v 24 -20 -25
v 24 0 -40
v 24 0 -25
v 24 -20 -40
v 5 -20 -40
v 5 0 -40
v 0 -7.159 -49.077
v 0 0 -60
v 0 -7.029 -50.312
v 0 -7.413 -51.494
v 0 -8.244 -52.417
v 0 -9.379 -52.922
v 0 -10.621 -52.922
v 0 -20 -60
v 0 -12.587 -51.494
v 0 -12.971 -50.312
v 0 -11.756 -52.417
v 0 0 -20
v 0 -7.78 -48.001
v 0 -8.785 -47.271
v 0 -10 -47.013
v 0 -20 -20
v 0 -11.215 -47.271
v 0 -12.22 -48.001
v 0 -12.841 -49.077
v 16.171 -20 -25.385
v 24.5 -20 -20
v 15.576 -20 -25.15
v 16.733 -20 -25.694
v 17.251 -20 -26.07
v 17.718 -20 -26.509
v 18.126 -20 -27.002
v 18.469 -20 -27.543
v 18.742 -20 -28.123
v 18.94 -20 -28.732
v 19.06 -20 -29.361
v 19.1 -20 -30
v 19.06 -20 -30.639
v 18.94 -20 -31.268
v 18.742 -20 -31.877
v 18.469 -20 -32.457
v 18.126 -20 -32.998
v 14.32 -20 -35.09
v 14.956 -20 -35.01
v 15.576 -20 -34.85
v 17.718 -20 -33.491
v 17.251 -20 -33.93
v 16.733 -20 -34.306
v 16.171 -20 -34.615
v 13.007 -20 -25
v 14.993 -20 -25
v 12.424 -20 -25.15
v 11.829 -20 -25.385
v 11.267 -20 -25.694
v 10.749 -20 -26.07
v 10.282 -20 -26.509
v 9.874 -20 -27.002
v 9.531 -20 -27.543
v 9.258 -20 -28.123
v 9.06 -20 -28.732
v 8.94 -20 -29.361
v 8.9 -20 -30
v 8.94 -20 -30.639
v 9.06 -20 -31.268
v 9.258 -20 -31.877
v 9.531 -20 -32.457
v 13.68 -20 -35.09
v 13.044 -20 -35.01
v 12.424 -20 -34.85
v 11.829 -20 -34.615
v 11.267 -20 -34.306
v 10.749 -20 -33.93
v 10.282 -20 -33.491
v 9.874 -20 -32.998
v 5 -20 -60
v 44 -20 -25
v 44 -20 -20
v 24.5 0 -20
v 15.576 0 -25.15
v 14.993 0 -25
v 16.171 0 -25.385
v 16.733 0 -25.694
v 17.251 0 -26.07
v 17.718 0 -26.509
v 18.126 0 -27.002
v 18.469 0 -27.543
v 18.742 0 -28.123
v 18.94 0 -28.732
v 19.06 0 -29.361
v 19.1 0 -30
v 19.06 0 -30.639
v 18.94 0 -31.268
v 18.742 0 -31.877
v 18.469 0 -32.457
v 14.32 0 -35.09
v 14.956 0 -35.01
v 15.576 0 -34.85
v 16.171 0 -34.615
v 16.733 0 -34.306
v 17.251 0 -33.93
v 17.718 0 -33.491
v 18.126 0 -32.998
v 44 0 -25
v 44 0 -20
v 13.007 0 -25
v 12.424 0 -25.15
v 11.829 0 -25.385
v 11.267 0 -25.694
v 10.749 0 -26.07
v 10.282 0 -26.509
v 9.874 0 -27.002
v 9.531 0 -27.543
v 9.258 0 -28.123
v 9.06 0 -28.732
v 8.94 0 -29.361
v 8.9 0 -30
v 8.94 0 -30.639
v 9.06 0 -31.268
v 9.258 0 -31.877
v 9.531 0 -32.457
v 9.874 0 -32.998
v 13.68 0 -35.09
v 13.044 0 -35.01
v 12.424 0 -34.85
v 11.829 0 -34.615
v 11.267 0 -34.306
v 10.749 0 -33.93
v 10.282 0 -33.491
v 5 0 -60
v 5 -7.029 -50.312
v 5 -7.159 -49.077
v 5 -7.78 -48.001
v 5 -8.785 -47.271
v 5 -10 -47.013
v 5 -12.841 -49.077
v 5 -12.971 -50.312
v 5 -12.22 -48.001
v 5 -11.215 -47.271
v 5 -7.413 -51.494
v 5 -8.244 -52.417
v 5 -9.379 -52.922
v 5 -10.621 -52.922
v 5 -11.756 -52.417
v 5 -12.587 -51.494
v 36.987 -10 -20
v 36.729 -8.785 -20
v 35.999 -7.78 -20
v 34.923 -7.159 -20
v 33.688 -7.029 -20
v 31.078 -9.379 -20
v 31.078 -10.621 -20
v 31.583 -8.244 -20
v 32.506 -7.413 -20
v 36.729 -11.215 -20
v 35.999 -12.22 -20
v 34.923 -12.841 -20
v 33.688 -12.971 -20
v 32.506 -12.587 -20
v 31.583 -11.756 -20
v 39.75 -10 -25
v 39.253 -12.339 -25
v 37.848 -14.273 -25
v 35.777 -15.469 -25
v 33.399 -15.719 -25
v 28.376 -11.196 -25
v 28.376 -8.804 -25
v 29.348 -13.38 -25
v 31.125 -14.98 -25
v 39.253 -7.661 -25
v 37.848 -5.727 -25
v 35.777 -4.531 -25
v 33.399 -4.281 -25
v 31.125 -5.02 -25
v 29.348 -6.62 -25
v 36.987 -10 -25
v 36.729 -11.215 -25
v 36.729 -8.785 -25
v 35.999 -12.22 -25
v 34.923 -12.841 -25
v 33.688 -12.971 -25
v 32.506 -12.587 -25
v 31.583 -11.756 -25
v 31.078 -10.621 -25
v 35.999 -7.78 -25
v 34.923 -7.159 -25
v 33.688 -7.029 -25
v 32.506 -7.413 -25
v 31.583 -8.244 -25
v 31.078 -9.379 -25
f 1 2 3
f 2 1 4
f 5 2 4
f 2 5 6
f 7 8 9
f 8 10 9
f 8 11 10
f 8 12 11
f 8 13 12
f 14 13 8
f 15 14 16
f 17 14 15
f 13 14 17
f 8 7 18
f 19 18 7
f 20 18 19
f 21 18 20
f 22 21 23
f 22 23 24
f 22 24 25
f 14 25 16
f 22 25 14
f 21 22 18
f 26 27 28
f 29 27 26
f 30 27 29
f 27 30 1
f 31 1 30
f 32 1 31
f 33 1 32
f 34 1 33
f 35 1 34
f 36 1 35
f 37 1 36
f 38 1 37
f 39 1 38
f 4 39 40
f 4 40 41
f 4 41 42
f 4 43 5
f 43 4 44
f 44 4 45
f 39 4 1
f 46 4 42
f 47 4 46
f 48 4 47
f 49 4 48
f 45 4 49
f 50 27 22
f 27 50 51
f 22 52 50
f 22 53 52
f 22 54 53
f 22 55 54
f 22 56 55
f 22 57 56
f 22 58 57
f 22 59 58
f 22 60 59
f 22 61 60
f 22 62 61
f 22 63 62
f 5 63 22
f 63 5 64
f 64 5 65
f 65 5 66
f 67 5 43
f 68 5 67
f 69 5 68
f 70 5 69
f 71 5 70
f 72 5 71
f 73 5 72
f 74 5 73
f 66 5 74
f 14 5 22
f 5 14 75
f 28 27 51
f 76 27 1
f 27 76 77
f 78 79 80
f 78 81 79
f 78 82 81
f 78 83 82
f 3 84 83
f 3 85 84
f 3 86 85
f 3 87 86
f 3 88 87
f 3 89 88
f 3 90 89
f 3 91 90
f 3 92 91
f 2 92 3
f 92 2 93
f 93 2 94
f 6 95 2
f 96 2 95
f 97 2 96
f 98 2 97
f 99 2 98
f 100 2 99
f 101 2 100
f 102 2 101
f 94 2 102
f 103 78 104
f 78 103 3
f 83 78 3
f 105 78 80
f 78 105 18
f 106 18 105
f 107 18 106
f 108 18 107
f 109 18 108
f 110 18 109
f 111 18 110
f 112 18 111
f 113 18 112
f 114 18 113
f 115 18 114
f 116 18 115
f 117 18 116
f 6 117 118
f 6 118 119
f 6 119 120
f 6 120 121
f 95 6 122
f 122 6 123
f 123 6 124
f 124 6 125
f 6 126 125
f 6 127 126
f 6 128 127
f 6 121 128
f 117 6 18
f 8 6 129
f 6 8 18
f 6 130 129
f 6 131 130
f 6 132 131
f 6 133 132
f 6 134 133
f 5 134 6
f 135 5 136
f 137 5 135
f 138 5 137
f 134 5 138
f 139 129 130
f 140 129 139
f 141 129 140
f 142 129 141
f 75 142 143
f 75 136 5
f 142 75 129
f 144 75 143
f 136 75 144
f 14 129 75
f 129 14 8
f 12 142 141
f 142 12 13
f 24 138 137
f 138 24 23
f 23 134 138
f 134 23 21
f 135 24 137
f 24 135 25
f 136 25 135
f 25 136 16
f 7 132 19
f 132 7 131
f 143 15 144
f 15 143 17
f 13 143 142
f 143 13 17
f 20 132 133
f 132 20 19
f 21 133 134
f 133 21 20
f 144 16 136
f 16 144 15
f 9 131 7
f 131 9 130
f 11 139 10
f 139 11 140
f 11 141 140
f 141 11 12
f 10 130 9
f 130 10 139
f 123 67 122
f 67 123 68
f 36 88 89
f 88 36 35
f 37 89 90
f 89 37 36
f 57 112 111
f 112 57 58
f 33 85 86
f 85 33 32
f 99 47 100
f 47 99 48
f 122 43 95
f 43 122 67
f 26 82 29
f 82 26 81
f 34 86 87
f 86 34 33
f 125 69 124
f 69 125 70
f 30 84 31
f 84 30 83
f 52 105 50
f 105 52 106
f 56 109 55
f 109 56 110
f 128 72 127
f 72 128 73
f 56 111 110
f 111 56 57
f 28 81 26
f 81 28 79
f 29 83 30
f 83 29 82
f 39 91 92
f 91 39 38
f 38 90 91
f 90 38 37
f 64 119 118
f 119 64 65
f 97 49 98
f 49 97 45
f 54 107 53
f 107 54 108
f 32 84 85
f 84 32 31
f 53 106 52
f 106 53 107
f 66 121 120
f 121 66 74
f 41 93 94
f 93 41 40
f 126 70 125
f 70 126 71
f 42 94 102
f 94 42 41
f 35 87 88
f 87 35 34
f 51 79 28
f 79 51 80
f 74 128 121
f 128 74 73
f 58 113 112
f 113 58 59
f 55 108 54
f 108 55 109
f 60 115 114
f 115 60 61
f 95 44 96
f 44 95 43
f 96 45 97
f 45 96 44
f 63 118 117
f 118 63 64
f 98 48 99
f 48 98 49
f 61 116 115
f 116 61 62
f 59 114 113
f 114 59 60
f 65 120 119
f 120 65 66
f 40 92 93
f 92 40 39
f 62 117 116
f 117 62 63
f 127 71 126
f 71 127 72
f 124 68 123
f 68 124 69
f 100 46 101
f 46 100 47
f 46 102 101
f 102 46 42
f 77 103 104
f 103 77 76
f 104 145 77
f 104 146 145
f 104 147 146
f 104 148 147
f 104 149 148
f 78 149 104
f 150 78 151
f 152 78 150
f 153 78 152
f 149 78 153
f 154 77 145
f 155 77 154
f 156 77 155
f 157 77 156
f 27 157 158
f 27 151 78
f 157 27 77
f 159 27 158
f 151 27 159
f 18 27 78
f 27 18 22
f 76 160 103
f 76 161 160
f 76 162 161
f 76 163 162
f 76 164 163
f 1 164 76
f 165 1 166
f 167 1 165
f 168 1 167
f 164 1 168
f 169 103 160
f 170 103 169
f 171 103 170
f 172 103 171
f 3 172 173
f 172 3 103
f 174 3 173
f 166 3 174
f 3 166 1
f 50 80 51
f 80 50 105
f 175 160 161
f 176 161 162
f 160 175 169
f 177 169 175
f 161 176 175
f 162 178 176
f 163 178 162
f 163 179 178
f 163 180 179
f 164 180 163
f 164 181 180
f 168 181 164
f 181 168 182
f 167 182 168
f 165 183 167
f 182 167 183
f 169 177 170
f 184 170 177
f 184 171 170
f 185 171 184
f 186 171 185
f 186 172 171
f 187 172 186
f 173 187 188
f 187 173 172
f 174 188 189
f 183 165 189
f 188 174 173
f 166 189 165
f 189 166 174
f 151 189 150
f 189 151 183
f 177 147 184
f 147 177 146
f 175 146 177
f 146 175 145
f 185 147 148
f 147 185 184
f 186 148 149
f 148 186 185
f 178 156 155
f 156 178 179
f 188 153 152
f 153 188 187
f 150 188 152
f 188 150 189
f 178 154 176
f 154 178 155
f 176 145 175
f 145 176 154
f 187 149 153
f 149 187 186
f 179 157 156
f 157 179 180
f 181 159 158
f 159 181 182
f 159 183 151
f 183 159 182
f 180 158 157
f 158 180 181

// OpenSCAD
// file: sub_front_pulleys.scad
include <nuts_and_bolts.scad>;
include <generals.scad>;

pulley_plate_x = 45;
pulley_plate_y = 28;

pulley_arm_x = pulley_plate_x + alu_x;
pulley_arm_y = pulley_plate_y + alu_x;

module front_pulley(lower = false, left = false)
{
    echo("FP:", lower, left);
	difference()
	{
		union()
		{
			translate([-alu_x, 0, 0]) cube([pulley_arm_x, alu_x, wall]);
			translate([-alu_x, -pulley_arm_y+alu_x, 0]) cube([alu_x, pulley_arm_y, wall]);
			translate([0, -pulley_plate_y, lower ? 0 : wall-thin_wall ]) cube([pulley_plate_x, pulley_plate_y, lower ? wall : thin_wall ]); //lower ? 0 : wall-thin_wall 

        /*    if (lower)
            {
                if(left)
                {
                    translate([hole_dist_1, -hole_dist_1, wall-1]) cylinder(h=alu_x+(wall-thin_wall)-bearing_pulley_h-2*belt_z_offset+1, d=pulley_b_d);
                }
                
                if (!left)
                {
                    translate([hole_dist_2+hole_x_offset, -hole_dist_2, wall-1]) cylinder(h=pulley_s_base_h+1, d=pulley_b_d-3.4);
                }
            }
        */
            if (!lower)
            {
                if(left)
                {
                    translate([hole_dist_2+hole_x_offset, -hole_dist_2, -(alu_x-bearing_pulley_h-2*belt_z_offset)]) cylinder(h=alu_x+wall-thin_wall-bearing_pulley_h-2*belt_z_offset+1, d=pulley_b_d-3.4);
                }
                
                if (!left)
                {
                    translate([hole_dist_1, -hole_dist_1, -(alu_x-bearing_pulley_h-2*belt_z_offset)]) cylinder(h=alu_x+thin_wall-bearing_pulley_h-2*belt_z_offset+1, d=pulley_b_d);

                    translate([hole_dist_2+hole_x_offset, -hole_dist_2, -(alu_x-bearing_pulley_h-2*belt_z_offset-pulley_s_base_h)]) cylinder(h=alu_x+wall-thin_wall-bearing_pulley_h-2*belt_z_offset-pulley_s_base_h+1, d=pulley_b_d-3.4);
                }
            }

		}

		translate([(pulley_arm_x - alu_x)*2/3, alu_x/2, -20]) rotate([0, 0, 0]) boltHole(size=bolt,length=40);
		translate([(pulley_arm_x - alu_x)*1/3, alu_x/2, -20]) rotate([0, 0, 0]) boltHole(size=bolt,length=40);
		translate([-alu_x/2, -(pulley_arm_y - alu_x)*2/3-1, -20]) rotate([0, 0, 0]) boltHole(size=bolt,length=40);
		translate([-alu_x/2, -(pulley_arm_y - alu_x)*1/4, -20]) rotate([0, 0, 0]) boltHole(size=bolt,length=40);
		
		translate([hole_dist_1, -hole_dist_1, -20]) boltHole(size=3, length=40);
		translate([hole_dist_2+hole_x_offset, -hole_dist_2, -20]) boltHole(size=3,length=40);
        
		if (lower)
		{
			translate([-alu_x-2+0.1, -0.1, -1]) cube([alu_x+2, alu_x+2, wall+2]);
		}
	}

}

/*
is_left = false;

front_pulley(false, is_left);

translate([0, 0, -alu_x-wall]) front_pulley(true, is_left);
*/
///color([0, 0.2, 0]) translate([hole_dist_1,-hole_dist_1,-pulley_height+2]) pulley();
//color([0, 0.4, 0]) translate([hole_dist_2+hole_x_offset,-hole_dist_2,-4]) mirror([0,0,1])pulley();

//color([0.5,0,0]) translate([30, -40, -alu_x]) cube([20,20,pulley_height+4]);
//color([0,0,0]) translate([5, 10, -alu_x]) cube([20,20,alu_x]);
// file: sub_rod_support.scad
include <nuts_and_bolts.scad>;
include <generals.scad>;

include <sub_front_pulleys.scad>;

y_sup_body_height = alu_x / 2 + wall + y_from_top;
y_sup_body_width = alu_x /2 + y_from_side;
y_back_spacing = -wall;

y_sup_arm_length_x = y_sup_body_width + alu_x;
y_sup_arm_length_z = y_sup_body_height + alu_x;

module rod_support(front = true, support_width = alu_x, support_height = y_sup_body_height, with_bottom = true)
{
	mirror([0, front ? 0 : 1, 0])
	difference()
	{
		union()
		{
			translate([0, 0, -support_height]) cube([y_sup_body_width, alu_x, support_height]);
			
			if (with_bottom)
			{
				translate([0, 0, -y_sup_arm_length_z]) cube([wall, support_width, y_sup_arm_length_z]);
			}
			else
			{
				translate([0, 0, -support_height]) cube([y_sup_body_width + alu_x, alu_x, wall]);
			}
		}

		translate([y_from_side, alu_x+1, -y_from_top-wall]) rotate([90, 0, 0]) cylinder(d = rod_dia + clearance, h = alu_x+2);

		if (with_bottom)
		{
			translate([6, alu_x/2, -y_sup_arm_length_z+(y_sup_arm_length_z-support_height)/2]) rotate([0, -90, 0]) boltHole(size=bolt,length=40);
		}
		else
		{
			translate([y_sup_body_width + alu_x/2, alu_x/2, -support_height-0.5]) rotate([0, 0, 0]) boltHole(bolt, length=wall+1);	
		}
	}
}

//rod_support(support_width=alu_x, with_bottom = true);
//translate([0, 60, 0]) rod_support(false);
// file: nuts_and_bolts.scad
// Copyright 2010 D1plo1d

// This library is dual licensed under the GPL 3.0 and the GNU Lesser General Public License as per http://creativecommons.org/licenses/LGPL/2.1/ .

//testNutsAndBolts();

module SKIPtestNutsAndBolts()
{
	$fn = 360;
	translate([0,15])nutHole(3);
	boltHole(3, length= 30);
}

MM = "mm";
INCH = "inch"; //Not yet supported

//Based on: http://www.roymech.co.uk/Useful_Tables/Screws/Hex_Screws.htm
METRIC_NUT_AC_WIDTHS =
[
	-1, //0 index is not used but reduces computation
	-1,
	-1,
	6.90,//m3
	8.10,//m4
	9.20,//m5
	11.50,//m6
	-1,
	15.50,//m8
	-1,
	19.60,//m10
	-1,
	22.10,//m12
	-1,
	-1,
	-1,
	27.70,//m16
	-1,
	-1,
	-1,
	34.60,//m20
	-1,
	-1,
	-1,
	41.60,//m24
	-1,
	-1,
	-1,
	-1,
	-1,
	53.1,//m30
	-1,
	-1,
	-1,
	-1,
	-1,
	63.5//m36
];
METRIC_NUT_THICKNESS =
[
	-1, //0 index is not used but reduces computation
	-1,
	-1,
	2.40,//m3
	3.20,//m4
	4.00,//m5
	5.00,//m6
	-1,
	6.50,//m8
	-1,
	8.00,//m10
	-1,
	10.00,//m12
	-1,
	-1,
	-1,
	13.00,//m16
	-1,
	-1,
	-1,
	16.00//m20
	-1,
	-1,
	-1,
	19.00,//m24
	-1,
	-1,
	-1,
	-1,
	-1,
	24.00,//m30
	-1,
	-1,
	-1,
	-1,
	-1,
	29.00//m36
];

COURSE_METRIC_BOLT_MAJOR_THREAD_DIAMETERS =
[//based on max values
	-1, //0 index is not used but reduces computation
	-1,
	-1,
	2.98,//m3
	3.978,//m4
	4.976,//m5
	5.974,//m6
	-1,
	7.972,//m8
	-1,
	9.968,//m10
	-1,
	11.966,//m12
	-1,
	-1,
	-1,
	15.962,//m16
	-1,
	-1,
	-1,
	19.958,//m20
	-1,
	-1,
	-1,
	23.952,//m24
	-1,
	-1,
	-1,
	-1,
	-1,
	29.947,//m30
	-1,
	-1,
	-1,
	-1,
	-1,
	35.940//m36
];

module nutHole(size, units=MM, tolerance = +0.0001, proj = -1)
{
	//takes a metric screw/nut size and looksup nut dimensions
	radius = METRIC_NUT_AC_WIDTHS[size]/2+tolerance;
	height = METRIC_NUT_THICKNESS[size]+tolerance;
	if (proj == -1)
	{
		cylinder(r= radius, h=height, $fn = 6, center=[0,0]);
	}
	if (proj == 1)
	{
		circle(r= radius, $fn = 6);
	}
	if (proj == 2)
	{
		translate([-radius/2, 0])
			square([radius*2, height]);
	}
}

module boltHole(size, units=MM, length, tolerance = +0.0001, proj = -1)
{
	radius = COURSE_METRIC_BOLT_MAJOR_THREAD_DIAMETERS[size]/2+tolerance;
//TODO: proper screw cap values
	capHeight = METRIC_NUT_THICKNESS[size]+tolerance; //METRIC_BOLT_CAP_HEIGHTS[size]+tolerance;
	capRadius = METRIC_NUT_AC_WIDTHS[size]/2+tolerance; //METRIC_BOLT_CAP_RADIUS[size]+tolerance;

	if (proj == -1)
	{
	translate([0, 0, -capHeight])
		cylinder(r= capRadius, h=capHeight, $fn=15);
	cylinder(r = radius, h = length, $fn=15);
	}
	if (proj == 1)
	{
		circle(r = radius);
	}
	if (proj == 2)
	{
		translate([-capRadius/2, -capHeight])
			square([capRadius*2, capHeight]);
		square([radius*2, length]);
	}
}

module boltHoleEx(size, units=MM, length, tolerance = +0.0001, shift_x=0, shift_y=0)
{
	radius = COURSE_METRIC_BOLT_MAJOR_THREAD_DIAMETERS[size]/2+tolerance;
//TODO: proper screw cap values
	capHeight = METRIC_NUT_THICKNESS[size]+tolerance; //METRIC_BOLT_CAP_HEIGHTS[size]+tolerance;
	capRadius = METRIC_NUT_AC_WIDTHS[size]/2+tolerance; //METRIC_BOLT_CAP_RADIUS[size]+tolerance;

	hull()
	{
		translate([0, 0, -capHeight]) cylinder(r= capRadius, h=capHeight, $fn=15);
		translate([shift_x, shift_y, -capHeight]) cylinder(r= capRadius, h=capHeight, $fn=15);
	}

	hull()
	{
		cylinder(r = radius, h = length, $fn=15);
		translate([shift_x, shift_y, 0]) cylinder(r = radius, h = length, $fn=15);
	}
}

//boltHoleEx(3, length=6);
// main file
include <nuts_and_bolts.scad>;
include <generals.scad>;

include <sub_rod_support.scad>;
include <sub_front_pulleys.scad>;

y_sup_height_back = y_sup_body_height + 20;

module back_rod_support()
{
	difference()
	{
		union()
		{
			translate([0, -alu_x, -alu_x-wall]) cube([y_sup_body_width+alu_x, alu_x, wall]);
			translate([0, 0, 0]) rod_support(front = false, with_bottom = true); //, support_width=wall + motor_from_side_y + nema17_side+alu_x+wall_clearance - alu_x);

		}

		translate([-0.5, -alu_x-0.5, -alu_x]) cube([y_sup_body_width+1, alu_x+1, alu_x+1]);
		translate([y_sup_body_width+alu_x/2, -alu_x/2, -alu_x-wall]) boltHole(bolt, length=wall+1);
	}
}

back_rod_support();
